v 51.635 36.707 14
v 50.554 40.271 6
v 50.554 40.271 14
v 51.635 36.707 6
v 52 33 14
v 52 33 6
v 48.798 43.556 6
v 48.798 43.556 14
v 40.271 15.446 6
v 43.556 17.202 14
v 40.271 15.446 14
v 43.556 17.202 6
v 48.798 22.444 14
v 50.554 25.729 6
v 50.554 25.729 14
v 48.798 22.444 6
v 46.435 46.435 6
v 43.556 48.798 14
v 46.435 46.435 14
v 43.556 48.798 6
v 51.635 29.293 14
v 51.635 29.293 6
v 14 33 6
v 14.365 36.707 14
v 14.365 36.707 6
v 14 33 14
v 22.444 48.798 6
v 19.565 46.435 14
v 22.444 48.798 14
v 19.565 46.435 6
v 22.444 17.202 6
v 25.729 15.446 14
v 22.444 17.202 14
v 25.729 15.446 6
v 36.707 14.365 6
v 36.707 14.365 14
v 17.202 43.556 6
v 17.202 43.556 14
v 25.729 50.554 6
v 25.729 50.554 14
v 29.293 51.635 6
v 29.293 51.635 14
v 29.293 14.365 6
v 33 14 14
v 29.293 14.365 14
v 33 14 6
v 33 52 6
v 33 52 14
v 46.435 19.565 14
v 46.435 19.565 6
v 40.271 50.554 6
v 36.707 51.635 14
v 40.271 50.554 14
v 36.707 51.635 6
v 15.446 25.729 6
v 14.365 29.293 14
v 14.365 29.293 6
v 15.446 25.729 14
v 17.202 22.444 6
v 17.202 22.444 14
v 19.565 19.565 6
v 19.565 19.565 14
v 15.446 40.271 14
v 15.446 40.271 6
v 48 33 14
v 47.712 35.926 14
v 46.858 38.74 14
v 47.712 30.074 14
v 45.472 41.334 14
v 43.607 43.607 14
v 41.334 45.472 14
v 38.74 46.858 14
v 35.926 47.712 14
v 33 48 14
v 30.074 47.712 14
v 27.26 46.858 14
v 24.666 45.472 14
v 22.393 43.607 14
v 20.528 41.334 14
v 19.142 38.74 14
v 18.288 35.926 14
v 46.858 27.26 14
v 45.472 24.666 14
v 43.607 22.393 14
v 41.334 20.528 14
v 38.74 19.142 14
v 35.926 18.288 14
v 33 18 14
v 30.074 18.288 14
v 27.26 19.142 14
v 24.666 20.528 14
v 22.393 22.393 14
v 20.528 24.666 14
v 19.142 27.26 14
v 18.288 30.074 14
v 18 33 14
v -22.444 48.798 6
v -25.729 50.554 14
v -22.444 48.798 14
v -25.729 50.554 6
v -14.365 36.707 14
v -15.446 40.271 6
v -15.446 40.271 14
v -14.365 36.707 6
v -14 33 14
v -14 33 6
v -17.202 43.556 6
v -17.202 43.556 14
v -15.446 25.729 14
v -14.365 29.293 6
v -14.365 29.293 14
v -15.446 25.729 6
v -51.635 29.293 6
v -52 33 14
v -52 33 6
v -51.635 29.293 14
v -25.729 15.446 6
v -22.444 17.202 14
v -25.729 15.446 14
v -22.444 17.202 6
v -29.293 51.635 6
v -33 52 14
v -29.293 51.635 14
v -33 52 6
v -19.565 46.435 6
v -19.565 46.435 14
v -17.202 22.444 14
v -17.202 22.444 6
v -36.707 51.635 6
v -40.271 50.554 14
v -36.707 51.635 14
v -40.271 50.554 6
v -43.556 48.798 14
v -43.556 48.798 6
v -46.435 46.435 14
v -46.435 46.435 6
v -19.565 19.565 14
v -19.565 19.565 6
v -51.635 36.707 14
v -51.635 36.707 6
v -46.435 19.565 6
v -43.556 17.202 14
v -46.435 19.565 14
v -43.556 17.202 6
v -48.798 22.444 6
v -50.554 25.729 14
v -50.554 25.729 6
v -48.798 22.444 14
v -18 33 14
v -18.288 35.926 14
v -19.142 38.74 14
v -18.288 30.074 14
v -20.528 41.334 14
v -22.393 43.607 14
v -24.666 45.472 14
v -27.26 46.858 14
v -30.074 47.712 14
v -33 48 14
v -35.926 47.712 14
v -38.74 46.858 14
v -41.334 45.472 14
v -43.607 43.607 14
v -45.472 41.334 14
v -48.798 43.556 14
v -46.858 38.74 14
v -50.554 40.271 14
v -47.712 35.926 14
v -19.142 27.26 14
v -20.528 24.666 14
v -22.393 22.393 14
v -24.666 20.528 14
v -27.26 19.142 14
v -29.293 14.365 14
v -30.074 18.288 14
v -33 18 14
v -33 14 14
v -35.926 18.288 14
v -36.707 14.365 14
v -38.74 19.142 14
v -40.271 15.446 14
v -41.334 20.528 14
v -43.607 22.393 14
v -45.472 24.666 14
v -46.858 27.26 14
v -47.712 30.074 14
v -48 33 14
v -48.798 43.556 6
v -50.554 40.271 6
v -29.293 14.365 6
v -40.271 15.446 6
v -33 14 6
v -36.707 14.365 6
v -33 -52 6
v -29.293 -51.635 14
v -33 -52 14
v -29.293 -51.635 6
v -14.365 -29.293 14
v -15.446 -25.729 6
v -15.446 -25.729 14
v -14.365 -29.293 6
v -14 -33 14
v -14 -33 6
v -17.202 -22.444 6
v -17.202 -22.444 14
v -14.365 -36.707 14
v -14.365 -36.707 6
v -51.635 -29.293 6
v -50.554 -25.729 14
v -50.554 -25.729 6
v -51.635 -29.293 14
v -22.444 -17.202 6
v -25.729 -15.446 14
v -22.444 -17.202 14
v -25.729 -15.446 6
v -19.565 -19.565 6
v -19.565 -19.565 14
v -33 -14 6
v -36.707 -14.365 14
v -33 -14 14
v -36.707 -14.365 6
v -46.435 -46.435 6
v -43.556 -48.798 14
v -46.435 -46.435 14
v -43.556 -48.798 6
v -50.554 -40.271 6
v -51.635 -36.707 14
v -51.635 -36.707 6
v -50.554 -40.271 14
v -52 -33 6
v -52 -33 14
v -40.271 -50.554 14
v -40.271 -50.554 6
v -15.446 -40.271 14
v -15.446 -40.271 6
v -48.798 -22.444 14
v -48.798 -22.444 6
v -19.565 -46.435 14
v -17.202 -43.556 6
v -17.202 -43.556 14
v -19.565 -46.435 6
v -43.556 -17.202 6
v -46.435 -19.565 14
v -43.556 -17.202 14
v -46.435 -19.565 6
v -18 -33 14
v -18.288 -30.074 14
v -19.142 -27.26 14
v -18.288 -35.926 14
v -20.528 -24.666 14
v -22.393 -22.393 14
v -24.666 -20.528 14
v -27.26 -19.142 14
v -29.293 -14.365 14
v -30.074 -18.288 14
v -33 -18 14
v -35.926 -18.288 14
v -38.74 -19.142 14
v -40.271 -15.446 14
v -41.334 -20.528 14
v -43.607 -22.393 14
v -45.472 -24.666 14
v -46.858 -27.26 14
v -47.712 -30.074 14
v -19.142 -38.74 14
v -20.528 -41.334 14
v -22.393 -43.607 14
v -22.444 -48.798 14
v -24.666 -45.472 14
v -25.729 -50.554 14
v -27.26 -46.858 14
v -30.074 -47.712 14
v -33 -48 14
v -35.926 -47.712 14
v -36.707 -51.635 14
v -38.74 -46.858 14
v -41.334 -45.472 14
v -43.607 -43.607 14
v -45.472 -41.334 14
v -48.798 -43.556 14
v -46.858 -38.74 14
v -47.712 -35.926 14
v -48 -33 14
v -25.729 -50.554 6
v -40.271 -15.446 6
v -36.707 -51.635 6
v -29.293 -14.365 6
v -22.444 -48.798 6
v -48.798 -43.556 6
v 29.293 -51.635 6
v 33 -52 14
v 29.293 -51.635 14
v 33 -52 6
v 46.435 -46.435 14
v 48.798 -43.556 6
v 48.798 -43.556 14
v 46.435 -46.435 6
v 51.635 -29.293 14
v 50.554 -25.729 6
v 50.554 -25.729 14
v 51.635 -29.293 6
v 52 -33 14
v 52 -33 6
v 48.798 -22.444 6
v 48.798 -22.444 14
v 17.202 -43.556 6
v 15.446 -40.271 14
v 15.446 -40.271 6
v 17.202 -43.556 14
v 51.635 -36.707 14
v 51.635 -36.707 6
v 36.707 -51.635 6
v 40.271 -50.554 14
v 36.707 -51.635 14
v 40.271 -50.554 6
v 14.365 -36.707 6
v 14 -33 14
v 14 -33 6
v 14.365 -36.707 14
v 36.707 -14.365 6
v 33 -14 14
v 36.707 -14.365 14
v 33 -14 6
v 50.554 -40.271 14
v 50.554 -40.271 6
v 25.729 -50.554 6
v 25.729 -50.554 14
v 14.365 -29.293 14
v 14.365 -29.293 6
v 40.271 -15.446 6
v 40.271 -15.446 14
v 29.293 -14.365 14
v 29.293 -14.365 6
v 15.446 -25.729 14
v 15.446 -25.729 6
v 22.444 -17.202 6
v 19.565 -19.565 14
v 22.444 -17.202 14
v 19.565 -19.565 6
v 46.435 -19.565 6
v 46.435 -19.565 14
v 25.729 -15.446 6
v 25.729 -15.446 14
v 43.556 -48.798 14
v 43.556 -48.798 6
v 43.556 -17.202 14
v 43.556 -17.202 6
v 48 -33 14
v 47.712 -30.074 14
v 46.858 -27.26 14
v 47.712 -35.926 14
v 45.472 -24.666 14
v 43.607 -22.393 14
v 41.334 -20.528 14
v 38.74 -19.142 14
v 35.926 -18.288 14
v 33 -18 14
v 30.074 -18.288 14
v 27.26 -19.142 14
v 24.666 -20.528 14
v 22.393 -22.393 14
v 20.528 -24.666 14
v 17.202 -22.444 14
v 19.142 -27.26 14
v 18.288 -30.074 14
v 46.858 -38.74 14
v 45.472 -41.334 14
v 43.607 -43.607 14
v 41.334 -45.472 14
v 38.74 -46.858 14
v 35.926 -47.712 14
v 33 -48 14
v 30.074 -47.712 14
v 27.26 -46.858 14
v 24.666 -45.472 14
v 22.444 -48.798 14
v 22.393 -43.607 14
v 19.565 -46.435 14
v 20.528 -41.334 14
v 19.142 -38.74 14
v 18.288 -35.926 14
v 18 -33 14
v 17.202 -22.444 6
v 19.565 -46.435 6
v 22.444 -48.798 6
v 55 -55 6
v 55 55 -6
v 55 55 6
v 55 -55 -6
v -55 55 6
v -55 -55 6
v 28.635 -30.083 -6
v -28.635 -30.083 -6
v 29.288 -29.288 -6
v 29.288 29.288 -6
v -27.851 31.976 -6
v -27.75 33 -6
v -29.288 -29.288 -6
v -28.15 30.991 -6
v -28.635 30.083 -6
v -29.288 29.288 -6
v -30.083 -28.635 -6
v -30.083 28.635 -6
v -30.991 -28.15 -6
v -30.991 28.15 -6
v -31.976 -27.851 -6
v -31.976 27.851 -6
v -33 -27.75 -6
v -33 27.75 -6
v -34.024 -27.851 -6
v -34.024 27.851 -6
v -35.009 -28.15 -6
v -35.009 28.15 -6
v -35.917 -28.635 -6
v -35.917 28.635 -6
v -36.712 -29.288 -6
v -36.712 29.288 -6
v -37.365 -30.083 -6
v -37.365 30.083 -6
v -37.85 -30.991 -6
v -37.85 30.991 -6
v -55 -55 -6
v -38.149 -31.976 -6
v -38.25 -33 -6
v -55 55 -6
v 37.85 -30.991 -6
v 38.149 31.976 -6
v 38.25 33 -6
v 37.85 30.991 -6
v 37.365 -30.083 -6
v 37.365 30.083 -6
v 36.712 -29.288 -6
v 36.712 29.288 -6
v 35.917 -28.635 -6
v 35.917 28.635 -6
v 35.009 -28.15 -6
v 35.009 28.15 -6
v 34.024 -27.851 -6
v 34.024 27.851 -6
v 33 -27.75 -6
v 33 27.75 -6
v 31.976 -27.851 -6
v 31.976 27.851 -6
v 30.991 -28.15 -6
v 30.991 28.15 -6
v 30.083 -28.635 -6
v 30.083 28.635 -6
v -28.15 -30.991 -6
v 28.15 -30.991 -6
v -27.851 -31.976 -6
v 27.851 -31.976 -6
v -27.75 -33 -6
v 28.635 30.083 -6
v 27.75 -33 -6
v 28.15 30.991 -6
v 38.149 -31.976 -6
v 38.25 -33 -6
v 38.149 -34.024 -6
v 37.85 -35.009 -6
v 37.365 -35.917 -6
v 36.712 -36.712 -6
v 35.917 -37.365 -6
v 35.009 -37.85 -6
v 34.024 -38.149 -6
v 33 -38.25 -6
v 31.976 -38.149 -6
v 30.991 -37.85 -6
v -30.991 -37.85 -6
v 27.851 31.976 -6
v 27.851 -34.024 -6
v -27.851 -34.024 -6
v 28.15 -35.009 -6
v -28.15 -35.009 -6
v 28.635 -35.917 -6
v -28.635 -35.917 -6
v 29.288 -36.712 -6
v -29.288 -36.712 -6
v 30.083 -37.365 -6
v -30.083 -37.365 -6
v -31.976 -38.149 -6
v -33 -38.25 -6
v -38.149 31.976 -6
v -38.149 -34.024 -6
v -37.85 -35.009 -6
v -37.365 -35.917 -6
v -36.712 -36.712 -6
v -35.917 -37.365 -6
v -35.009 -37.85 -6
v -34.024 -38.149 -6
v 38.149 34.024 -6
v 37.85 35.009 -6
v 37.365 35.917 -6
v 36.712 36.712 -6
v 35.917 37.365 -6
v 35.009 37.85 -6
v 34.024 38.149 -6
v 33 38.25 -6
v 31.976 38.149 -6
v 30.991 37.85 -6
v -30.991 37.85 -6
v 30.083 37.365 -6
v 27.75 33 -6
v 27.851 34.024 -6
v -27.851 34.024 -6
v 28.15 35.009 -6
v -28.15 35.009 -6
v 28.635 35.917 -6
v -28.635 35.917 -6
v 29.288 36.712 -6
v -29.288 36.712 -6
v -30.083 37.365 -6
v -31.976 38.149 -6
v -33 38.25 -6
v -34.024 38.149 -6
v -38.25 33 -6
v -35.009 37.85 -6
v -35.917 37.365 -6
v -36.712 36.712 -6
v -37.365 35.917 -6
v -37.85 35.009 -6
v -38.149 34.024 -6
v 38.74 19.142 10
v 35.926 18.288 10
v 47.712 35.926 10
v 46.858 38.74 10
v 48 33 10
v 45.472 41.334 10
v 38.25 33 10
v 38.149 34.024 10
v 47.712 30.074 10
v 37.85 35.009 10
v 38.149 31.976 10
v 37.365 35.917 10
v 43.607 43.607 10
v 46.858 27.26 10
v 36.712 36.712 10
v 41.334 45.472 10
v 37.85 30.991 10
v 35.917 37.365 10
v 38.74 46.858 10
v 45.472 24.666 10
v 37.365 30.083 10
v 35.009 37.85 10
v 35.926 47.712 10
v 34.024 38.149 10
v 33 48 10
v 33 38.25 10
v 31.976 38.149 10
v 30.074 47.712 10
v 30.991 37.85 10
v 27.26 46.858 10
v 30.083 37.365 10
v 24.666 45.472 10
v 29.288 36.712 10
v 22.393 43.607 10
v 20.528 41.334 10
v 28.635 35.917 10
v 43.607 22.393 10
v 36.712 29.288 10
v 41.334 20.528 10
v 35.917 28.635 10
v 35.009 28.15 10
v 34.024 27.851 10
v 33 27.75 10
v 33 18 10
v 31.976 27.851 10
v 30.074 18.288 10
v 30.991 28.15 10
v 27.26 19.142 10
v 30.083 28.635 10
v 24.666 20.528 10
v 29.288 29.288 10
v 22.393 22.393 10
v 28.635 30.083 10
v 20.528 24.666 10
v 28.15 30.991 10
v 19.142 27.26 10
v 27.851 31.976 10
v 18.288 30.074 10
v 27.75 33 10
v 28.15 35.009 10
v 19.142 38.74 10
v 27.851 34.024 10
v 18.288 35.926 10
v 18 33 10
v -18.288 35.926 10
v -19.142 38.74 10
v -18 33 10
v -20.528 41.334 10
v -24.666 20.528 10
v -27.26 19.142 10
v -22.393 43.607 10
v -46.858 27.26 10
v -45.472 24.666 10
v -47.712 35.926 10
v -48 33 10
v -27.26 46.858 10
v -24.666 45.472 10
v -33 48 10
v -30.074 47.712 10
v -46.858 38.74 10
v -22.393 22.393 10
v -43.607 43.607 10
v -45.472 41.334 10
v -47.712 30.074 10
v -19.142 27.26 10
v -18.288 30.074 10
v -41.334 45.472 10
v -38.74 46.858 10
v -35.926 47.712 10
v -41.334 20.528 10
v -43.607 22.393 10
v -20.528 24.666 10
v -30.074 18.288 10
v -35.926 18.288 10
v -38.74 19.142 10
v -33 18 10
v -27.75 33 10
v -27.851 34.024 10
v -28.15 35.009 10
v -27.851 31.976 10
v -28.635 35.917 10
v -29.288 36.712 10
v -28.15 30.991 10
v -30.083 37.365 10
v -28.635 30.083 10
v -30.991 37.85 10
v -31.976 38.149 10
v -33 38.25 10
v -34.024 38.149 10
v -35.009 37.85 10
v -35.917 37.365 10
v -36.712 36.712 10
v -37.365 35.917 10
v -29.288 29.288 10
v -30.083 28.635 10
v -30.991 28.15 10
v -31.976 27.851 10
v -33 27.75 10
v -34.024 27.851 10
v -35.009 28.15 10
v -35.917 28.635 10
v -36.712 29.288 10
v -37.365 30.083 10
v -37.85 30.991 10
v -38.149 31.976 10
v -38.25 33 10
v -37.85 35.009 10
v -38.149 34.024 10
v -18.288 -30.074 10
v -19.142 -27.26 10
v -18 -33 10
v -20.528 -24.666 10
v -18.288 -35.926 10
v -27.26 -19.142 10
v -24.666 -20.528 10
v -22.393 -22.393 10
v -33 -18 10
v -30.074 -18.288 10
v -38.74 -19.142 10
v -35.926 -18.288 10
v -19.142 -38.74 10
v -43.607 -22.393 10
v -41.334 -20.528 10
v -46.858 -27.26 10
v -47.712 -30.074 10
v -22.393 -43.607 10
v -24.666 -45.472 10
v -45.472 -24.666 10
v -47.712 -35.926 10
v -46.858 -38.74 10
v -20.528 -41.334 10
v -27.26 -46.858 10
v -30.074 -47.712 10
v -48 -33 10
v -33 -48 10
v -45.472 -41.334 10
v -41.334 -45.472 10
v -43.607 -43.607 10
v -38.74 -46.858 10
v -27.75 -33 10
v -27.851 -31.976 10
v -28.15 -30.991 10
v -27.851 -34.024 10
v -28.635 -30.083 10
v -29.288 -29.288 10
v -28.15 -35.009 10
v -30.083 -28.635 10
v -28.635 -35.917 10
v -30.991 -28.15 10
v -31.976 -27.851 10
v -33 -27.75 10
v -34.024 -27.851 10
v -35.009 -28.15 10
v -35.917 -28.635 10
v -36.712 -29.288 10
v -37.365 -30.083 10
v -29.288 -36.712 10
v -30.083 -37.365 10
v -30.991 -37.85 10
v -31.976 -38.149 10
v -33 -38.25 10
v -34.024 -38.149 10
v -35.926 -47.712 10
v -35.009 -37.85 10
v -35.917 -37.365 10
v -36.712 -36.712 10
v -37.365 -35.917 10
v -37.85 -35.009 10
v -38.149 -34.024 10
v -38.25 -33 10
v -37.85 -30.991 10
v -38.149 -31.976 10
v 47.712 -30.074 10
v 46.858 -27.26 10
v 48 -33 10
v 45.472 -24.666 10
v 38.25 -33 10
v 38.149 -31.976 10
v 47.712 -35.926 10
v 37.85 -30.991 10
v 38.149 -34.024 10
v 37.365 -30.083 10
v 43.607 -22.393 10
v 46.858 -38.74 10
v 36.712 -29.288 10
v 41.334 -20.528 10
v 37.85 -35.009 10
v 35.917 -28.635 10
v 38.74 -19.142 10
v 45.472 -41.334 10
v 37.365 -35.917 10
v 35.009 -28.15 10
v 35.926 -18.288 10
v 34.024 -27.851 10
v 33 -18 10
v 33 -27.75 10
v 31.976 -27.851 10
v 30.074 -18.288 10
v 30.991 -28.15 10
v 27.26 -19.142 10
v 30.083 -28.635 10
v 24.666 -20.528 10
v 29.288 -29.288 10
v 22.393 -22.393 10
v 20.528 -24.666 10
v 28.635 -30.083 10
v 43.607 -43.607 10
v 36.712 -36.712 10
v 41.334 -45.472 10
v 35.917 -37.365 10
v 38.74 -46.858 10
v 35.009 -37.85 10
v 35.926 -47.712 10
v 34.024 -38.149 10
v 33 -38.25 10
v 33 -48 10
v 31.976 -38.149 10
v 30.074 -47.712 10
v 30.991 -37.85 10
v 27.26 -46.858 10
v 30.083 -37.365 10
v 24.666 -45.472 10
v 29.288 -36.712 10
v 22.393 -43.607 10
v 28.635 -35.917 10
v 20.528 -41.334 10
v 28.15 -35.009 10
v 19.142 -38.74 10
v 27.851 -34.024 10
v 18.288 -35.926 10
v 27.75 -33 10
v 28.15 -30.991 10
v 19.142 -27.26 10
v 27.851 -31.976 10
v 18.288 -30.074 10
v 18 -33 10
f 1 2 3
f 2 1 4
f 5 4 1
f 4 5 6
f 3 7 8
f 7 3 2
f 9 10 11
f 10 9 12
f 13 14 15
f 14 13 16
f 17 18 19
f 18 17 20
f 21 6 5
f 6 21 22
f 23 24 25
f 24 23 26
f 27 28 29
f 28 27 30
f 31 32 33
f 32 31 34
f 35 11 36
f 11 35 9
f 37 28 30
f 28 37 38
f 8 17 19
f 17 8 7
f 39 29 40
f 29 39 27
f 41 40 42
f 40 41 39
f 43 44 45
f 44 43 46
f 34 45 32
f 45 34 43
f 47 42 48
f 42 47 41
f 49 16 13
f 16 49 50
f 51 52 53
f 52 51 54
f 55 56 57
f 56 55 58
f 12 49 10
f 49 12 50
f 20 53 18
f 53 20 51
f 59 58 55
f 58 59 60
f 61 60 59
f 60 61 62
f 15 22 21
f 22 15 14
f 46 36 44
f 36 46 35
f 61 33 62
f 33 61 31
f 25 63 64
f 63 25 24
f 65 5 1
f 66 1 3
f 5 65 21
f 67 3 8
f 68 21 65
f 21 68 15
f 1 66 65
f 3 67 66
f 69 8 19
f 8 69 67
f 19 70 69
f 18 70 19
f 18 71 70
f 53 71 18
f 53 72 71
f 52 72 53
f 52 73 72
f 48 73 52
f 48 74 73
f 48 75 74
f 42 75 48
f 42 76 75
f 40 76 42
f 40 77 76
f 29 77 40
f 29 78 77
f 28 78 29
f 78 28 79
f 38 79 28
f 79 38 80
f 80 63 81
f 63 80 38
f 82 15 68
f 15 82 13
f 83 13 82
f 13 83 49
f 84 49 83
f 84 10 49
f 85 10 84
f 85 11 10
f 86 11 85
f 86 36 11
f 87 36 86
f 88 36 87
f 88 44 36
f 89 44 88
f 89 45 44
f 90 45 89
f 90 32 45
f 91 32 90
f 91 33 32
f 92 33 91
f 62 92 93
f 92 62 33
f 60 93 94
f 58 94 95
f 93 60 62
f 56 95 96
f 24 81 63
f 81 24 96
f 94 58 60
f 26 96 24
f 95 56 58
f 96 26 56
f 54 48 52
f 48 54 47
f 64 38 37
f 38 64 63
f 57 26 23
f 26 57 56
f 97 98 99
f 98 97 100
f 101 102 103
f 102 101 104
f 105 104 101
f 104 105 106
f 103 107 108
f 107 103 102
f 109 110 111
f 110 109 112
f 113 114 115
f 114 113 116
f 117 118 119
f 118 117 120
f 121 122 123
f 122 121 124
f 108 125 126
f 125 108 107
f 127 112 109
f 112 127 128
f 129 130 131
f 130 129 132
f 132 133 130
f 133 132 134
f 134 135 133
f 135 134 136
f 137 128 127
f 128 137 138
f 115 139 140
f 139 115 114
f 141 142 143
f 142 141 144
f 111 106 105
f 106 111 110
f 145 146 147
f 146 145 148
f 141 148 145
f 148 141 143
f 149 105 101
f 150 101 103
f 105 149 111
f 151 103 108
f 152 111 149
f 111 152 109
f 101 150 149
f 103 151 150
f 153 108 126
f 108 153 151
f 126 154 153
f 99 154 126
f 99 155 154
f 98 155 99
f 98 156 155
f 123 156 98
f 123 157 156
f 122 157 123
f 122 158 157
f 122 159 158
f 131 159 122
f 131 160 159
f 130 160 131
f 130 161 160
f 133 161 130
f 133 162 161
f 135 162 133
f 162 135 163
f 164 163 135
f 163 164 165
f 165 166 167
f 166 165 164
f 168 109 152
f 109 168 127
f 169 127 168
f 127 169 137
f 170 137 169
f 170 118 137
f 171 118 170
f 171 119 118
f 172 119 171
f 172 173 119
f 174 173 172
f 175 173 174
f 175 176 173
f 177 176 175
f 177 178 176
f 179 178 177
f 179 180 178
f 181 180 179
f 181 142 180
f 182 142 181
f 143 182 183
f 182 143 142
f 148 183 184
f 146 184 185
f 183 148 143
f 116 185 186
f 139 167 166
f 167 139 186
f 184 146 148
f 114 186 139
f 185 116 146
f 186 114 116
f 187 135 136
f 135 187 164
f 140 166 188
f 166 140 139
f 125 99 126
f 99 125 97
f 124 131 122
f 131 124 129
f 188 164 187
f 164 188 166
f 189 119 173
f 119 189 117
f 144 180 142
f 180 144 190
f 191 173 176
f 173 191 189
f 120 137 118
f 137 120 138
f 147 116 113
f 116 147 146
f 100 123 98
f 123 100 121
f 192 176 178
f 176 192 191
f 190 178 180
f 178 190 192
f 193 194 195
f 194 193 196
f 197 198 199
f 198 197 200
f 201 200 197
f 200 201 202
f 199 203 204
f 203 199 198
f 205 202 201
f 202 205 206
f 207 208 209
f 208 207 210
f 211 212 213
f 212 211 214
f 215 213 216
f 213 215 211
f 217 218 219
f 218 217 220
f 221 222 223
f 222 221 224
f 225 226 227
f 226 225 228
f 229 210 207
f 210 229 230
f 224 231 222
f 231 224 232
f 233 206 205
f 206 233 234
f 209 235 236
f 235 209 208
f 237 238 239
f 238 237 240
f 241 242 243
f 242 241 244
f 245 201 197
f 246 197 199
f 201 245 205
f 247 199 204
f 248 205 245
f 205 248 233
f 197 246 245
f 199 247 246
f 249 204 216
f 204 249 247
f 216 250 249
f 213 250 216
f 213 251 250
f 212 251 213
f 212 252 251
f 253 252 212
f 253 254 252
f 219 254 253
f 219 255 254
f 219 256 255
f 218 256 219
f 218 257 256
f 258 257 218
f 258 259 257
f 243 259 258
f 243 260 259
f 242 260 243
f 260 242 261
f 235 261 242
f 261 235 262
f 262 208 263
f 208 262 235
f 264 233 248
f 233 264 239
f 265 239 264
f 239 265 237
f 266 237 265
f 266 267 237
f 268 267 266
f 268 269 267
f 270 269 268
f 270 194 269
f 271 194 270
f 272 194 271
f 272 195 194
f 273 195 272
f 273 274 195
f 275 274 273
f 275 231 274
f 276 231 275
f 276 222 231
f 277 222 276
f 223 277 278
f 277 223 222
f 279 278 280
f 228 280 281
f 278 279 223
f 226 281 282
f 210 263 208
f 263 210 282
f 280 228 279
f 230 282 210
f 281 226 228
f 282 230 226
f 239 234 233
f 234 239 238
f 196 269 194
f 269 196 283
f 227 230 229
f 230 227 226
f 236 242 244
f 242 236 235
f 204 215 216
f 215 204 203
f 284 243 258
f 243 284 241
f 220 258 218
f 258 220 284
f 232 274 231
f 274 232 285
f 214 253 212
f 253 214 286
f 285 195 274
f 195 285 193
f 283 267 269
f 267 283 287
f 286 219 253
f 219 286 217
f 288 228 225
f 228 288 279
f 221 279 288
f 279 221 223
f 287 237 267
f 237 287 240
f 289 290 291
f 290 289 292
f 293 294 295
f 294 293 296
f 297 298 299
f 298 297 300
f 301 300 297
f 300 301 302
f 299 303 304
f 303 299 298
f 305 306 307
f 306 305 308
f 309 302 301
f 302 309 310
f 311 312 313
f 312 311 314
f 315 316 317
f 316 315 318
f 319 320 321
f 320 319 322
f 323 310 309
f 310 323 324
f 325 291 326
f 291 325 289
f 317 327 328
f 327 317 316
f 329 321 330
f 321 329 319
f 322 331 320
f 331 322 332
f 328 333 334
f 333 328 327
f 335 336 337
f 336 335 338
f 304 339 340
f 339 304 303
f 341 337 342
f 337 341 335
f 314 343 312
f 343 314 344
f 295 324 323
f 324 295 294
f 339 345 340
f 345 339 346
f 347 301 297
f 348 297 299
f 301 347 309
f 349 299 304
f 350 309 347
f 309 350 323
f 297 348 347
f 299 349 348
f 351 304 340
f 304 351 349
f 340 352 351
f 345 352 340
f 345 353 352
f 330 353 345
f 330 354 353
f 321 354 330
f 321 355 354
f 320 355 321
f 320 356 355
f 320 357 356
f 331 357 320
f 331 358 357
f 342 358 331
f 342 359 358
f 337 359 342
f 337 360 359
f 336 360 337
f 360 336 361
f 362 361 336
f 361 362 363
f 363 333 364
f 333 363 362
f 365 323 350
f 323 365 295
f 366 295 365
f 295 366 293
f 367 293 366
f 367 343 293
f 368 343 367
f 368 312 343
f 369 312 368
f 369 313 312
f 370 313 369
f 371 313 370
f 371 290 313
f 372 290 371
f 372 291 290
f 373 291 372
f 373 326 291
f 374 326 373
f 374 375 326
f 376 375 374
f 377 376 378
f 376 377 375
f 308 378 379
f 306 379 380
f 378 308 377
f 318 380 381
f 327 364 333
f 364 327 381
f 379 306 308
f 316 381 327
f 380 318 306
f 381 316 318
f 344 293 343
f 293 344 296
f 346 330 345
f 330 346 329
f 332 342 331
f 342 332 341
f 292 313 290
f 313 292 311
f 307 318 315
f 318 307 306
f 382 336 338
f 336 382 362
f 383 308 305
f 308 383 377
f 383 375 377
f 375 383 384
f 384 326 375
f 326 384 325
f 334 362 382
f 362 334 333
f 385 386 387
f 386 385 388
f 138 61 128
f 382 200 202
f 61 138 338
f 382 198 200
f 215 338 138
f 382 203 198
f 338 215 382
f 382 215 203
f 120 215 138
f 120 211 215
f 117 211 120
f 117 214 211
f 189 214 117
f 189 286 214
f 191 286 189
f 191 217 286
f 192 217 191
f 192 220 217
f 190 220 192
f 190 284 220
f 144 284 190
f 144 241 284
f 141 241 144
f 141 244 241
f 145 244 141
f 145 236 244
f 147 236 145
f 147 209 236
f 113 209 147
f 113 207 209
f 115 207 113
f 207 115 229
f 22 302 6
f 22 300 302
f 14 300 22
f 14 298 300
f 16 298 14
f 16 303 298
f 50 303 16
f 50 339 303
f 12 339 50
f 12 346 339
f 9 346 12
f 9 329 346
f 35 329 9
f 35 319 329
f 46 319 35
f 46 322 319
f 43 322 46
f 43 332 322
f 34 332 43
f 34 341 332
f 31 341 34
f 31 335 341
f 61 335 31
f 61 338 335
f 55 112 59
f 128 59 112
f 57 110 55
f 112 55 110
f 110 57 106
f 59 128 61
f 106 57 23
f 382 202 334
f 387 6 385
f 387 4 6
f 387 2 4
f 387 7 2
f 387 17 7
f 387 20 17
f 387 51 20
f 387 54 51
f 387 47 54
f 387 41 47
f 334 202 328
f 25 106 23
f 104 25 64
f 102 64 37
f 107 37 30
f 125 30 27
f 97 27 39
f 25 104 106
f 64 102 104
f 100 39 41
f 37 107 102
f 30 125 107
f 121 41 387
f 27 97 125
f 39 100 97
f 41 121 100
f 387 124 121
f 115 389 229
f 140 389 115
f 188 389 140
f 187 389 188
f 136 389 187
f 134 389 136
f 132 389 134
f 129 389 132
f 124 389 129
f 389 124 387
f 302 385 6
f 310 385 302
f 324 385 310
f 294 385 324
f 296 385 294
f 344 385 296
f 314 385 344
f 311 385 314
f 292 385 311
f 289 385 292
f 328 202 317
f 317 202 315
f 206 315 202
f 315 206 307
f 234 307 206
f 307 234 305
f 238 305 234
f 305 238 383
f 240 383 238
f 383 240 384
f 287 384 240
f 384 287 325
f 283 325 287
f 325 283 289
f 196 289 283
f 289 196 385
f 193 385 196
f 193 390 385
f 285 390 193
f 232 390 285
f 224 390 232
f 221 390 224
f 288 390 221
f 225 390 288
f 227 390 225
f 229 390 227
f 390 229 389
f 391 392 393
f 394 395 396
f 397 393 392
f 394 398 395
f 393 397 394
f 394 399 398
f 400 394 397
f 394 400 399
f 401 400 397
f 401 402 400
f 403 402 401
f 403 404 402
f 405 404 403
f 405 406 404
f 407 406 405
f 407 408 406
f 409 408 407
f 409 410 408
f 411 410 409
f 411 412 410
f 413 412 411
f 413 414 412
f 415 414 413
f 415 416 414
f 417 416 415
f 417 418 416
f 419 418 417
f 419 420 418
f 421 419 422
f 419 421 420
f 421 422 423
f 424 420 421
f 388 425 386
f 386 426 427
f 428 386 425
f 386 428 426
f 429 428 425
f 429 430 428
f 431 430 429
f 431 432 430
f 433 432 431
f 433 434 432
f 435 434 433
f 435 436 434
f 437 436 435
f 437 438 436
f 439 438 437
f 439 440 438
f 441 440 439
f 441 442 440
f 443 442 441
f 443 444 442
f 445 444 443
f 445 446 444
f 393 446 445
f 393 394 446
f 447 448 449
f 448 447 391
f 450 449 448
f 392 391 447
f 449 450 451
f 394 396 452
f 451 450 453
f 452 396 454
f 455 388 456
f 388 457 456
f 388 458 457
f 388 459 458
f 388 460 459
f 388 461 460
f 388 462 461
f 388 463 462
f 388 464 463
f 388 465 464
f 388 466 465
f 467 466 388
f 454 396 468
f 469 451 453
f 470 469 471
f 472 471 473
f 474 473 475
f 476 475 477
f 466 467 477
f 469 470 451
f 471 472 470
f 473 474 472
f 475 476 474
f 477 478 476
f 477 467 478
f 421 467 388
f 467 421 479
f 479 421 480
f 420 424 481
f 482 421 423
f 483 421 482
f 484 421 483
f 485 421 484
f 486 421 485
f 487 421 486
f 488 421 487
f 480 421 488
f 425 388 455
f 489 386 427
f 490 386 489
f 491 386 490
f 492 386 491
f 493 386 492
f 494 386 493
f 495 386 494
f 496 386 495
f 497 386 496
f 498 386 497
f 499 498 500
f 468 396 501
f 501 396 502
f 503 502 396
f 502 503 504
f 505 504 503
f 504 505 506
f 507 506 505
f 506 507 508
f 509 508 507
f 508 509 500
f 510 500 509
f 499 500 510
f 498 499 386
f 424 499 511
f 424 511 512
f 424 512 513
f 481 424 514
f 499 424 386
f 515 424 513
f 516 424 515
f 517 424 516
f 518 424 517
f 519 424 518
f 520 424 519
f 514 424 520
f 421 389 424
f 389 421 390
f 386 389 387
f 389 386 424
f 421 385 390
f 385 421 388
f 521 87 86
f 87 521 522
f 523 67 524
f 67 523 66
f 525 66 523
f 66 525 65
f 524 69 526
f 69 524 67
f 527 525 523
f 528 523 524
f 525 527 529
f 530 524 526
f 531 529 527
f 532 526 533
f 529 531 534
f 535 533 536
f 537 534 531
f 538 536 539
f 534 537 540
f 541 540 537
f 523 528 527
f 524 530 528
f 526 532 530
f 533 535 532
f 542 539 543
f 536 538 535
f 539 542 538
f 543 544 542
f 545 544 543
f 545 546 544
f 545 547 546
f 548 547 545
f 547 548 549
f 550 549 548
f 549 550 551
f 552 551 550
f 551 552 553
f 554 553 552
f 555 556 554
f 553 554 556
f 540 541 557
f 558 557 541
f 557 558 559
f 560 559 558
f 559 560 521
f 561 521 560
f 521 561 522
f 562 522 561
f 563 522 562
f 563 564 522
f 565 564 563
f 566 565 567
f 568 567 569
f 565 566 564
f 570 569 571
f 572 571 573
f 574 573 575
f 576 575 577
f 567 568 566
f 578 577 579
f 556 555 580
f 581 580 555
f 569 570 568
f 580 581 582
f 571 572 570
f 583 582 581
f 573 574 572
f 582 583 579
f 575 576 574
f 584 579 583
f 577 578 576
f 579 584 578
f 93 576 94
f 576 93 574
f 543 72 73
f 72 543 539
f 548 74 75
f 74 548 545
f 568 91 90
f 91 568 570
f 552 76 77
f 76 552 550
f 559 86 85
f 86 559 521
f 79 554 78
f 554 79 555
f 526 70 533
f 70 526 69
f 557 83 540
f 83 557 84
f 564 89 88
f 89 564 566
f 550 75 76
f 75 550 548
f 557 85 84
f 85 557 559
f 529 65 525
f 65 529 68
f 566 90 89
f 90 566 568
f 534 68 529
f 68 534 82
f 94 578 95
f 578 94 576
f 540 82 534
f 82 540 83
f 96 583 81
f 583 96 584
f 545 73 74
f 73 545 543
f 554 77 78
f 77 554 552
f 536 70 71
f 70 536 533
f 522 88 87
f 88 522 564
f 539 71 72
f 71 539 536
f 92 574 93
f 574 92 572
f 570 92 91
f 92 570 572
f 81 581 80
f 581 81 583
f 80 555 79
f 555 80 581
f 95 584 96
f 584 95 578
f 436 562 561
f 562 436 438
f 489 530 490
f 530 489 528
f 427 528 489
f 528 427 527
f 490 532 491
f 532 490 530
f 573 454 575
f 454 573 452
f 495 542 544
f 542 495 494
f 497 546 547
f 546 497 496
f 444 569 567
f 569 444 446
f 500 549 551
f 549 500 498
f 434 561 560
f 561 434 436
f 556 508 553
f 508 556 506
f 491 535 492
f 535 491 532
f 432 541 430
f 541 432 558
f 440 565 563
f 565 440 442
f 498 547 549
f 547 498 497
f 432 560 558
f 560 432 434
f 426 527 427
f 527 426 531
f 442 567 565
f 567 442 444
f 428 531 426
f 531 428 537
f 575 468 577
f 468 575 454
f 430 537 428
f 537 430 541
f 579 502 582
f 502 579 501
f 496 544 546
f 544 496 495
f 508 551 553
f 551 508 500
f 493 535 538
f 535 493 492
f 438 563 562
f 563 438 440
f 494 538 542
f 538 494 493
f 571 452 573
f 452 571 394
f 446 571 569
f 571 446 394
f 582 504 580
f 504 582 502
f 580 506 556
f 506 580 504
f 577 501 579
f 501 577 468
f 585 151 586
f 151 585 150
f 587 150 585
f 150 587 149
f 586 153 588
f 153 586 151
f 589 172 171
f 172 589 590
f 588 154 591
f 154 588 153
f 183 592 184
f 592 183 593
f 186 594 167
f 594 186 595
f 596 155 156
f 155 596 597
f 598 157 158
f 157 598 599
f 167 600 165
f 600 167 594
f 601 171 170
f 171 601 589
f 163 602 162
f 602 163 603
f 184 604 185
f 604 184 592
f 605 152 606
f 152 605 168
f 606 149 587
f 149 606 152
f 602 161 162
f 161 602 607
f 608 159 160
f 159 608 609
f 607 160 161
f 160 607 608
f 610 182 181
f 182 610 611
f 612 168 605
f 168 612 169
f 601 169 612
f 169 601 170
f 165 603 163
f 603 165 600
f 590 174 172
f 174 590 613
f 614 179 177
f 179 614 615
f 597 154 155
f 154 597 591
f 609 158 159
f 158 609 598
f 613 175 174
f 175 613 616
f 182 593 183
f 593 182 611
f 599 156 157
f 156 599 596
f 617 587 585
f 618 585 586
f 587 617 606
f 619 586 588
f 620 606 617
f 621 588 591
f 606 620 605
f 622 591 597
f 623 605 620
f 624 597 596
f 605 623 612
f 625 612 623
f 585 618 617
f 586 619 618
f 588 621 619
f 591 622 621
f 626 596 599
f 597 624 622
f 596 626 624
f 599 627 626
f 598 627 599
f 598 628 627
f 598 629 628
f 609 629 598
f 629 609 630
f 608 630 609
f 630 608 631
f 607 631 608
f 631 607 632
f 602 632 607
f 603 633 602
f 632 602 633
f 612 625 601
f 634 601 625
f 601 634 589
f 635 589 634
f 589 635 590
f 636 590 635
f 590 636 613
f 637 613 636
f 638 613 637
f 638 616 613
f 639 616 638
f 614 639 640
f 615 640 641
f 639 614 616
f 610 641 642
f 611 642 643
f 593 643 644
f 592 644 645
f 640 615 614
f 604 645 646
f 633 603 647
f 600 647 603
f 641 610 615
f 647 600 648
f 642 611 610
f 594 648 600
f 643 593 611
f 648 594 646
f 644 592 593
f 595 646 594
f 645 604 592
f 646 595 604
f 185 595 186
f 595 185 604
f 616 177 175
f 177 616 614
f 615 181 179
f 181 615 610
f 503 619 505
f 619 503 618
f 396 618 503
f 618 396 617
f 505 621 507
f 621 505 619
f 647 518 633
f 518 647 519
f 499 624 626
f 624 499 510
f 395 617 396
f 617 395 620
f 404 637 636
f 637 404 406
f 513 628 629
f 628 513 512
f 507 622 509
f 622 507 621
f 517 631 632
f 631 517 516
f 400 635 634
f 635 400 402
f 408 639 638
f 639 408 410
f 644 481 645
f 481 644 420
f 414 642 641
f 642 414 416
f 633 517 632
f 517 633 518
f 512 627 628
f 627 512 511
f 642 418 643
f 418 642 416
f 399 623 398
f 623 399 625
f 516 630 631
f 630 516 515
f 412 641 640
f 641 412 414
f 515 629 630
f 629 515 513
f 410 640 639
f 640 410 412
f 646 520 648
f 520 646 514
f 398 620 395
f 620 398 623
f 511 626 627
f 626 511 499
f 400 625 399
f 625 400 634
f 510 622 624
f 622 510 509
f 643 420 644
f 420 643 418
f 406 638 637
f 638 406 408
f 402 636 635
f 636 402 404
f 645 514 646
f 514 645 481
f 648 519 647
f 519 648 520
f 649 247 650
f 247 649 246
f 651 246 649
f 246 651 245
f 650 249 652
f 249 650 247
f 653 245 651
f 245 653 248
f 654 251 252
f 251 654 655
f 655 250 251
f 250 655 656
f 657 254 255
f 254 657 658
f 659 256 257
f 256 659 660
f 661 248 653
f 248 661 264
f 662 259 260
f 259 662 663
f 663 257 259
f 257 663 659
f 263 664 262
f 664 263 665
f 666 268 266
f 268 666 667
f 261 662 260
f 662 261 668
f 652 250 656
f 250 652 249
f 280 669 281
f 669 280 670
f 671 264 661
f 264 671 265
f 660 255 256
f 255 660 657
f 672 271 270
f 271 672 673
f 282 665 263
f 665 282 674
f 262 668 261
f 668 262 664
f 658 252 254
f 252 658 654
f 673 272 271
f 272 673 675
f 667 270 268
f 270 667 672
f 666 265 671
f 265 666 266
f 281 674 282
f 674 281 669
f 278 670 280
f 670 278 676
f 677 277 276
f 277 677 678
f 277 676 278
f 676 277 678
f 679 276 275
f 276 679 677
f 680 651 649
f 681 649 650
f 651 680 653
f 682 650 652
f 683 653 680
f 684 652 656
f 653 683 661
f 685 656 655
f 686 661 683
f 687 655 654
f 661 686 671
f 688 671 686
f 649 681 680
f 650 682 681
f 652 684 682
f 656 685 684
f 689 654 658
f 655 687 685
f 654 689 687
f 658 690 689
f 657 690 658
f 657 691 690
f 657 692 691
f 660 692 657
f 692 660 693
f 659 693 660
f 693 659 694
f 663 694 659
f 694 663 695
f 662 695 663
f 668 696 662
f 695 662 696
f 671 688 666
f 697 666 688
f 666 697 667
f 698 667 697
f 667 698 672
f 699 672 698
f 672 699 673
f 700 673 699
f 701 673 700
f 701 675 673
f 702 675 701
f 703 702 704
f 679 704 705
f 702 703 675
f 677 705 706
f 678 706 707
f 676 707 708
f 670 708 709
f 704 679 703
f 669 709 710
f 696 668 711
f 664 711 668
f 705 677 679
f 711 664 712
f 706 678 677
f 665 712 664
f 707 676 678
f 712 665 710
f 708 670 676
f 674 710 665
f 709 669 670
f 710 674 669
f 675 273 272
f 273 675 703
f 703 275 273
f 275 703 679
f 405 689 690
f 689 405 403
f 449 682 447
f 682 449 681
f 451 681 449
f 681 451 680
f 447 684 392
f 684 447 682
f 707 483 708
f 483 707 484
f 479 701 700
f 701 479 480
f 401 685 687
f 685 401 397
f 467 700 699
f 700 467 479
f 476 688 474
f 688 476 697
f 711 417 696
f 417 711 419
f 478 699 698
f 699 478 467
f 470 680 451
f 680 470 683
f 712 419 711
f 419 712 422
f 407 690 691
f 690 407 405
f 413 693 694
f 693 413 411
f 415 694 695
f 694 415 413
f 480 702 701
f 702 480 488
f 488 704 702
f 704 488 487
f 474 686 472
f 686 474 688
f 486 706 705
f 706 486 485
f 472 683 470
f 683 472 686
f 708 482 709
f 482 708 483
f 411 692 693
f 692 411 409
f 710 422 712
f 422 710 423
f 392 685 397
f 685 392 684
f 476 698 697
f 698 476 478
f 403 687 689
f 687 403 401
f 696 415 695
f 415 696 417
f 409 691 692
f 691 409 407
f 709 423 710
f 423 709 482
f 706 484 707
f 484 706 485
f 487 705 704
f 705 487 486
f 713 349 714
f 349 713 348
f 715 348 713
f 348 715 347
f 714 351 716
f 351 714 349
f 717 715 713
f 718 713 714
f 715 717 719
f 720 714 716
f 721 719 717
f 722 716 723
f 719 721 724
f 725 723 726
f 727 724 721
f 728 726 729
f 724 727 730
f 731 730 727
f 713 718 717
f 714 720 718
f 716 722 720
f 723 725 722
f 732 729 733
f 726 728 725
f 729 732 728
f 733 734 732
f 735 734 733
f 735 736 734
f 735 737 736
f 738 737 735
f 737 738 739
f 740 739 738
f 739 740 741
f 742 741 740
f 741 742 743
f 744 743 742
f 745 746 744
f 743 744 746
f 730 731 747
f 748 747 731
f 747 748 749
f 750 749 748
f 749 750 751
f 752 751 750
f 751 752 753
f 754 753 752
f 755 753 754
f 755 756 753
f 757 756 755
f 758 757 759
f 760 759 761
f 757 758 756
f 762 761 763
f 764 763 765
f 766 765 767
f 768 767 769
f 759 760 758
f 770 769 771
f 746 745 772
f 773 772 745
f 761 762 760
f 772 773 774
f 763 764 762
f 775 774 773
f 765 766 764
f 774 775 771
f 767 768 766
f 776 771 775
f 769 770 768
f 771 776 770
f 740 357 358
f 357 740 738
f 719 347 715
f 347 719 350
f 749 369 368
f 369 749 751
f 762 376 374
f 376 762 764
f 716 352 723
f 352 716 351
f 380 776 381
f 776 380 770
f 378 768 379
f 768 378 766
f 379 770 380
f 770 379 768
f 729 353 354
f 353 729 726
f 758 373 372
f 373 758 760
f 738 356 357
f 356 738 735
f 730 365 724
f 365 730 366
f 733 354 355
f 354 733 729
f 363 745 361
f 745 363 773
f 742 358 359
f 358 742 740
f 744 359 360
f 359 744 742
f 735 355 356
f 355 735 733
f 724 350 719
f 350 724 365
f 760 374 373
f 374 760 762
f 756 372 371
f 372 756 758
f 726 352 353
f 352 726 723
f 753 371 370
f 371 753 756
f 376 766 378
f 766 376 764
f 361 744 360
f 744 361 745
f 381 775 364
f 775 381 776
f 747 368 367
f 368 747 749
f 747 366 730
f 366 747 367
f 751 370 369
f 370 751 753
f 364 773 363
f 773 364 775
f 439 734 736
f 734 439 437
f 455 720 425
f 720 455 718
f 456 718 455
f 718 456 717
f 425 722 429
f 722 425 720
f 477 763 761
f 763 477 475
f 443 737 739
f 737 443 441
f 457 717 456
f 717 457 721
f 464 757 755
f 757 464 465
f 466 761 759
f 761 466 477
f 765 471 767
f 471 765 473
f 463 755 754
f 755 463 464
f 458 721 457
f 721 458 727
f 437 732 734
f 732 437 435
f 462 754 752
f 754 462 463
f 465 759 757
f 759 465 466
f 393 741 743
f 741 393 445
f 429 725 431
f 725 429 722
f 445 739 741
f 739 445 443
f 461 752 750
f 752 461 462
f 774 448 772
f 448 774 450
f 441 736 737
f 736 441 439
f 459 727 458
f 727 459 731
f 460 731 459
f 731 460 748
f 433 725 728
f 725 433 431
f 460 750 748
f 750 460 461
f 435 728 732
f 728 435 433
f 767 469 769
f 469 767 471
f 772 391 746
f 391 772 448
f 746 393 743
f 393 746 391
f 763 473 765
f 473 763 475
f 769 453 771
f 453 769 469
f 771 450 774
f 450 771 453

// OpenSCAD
$fn = 32;

// ----------------------------------------------------------------------
// Socket pad plate
// bosses with counterbored sockets for the screws
// ----------------------------------------------------------------------

// --- parameters (mm) ---
base_t = 12;             // base plate thickness
boss_h = 8;              // boss height above the base plate
boss_d = 38;             // boss diameter
socket_d = 30;           // socket diameter
socket_depth = 4;        // socket depth from the boss face
bolt_d = 10.5;           // screw clearance hole through the socket floor
plate = [110, 110, 12];  // overall size (x, y, z)
edge = 22;               // boss centre offset from the plate edge
pads = 4;                // boss count, one per corner

// --- derived feature positions (mm) ---
height = base_t + boss_h;        // = 20   overall height of the part
corner_x = plate[0] / 2 - edge;  // = 33   boss centre X
corner_y = plate[1] / 2 - edge;  // = 33   boss centre Y
feature_centers = [
  [corner_x, corner_y],
  [-corner_x, corner_y],
  [-corner_x, -corner_y],
  [corner_x, -corner_y]
];   // boss centres: sockets, holes and the pads themselves are placed from here

// base plate, bosses on feature_centers, socket + through hole in each
difference() {
  union() {
    cube(plate, center = true);
    for (centre = feature_centers)
      translate([centre[0], centre[1], plate[2] / 2 - 1])
        cylinder(d = boss_d, h = boss_h + 1);
  }
  for (centre = feature_centers) {
    translate([centre[0], centre[1], plate[2] / 2 + boss_h - socket_depth])
      cylinder(d = socket_d, h = socket_depth + 1);
    translate([centre[0], centre[1], -height])
      cylinder(d = bolt_d, h = 2 * height + 2);  // through the socket floor
  }
}
